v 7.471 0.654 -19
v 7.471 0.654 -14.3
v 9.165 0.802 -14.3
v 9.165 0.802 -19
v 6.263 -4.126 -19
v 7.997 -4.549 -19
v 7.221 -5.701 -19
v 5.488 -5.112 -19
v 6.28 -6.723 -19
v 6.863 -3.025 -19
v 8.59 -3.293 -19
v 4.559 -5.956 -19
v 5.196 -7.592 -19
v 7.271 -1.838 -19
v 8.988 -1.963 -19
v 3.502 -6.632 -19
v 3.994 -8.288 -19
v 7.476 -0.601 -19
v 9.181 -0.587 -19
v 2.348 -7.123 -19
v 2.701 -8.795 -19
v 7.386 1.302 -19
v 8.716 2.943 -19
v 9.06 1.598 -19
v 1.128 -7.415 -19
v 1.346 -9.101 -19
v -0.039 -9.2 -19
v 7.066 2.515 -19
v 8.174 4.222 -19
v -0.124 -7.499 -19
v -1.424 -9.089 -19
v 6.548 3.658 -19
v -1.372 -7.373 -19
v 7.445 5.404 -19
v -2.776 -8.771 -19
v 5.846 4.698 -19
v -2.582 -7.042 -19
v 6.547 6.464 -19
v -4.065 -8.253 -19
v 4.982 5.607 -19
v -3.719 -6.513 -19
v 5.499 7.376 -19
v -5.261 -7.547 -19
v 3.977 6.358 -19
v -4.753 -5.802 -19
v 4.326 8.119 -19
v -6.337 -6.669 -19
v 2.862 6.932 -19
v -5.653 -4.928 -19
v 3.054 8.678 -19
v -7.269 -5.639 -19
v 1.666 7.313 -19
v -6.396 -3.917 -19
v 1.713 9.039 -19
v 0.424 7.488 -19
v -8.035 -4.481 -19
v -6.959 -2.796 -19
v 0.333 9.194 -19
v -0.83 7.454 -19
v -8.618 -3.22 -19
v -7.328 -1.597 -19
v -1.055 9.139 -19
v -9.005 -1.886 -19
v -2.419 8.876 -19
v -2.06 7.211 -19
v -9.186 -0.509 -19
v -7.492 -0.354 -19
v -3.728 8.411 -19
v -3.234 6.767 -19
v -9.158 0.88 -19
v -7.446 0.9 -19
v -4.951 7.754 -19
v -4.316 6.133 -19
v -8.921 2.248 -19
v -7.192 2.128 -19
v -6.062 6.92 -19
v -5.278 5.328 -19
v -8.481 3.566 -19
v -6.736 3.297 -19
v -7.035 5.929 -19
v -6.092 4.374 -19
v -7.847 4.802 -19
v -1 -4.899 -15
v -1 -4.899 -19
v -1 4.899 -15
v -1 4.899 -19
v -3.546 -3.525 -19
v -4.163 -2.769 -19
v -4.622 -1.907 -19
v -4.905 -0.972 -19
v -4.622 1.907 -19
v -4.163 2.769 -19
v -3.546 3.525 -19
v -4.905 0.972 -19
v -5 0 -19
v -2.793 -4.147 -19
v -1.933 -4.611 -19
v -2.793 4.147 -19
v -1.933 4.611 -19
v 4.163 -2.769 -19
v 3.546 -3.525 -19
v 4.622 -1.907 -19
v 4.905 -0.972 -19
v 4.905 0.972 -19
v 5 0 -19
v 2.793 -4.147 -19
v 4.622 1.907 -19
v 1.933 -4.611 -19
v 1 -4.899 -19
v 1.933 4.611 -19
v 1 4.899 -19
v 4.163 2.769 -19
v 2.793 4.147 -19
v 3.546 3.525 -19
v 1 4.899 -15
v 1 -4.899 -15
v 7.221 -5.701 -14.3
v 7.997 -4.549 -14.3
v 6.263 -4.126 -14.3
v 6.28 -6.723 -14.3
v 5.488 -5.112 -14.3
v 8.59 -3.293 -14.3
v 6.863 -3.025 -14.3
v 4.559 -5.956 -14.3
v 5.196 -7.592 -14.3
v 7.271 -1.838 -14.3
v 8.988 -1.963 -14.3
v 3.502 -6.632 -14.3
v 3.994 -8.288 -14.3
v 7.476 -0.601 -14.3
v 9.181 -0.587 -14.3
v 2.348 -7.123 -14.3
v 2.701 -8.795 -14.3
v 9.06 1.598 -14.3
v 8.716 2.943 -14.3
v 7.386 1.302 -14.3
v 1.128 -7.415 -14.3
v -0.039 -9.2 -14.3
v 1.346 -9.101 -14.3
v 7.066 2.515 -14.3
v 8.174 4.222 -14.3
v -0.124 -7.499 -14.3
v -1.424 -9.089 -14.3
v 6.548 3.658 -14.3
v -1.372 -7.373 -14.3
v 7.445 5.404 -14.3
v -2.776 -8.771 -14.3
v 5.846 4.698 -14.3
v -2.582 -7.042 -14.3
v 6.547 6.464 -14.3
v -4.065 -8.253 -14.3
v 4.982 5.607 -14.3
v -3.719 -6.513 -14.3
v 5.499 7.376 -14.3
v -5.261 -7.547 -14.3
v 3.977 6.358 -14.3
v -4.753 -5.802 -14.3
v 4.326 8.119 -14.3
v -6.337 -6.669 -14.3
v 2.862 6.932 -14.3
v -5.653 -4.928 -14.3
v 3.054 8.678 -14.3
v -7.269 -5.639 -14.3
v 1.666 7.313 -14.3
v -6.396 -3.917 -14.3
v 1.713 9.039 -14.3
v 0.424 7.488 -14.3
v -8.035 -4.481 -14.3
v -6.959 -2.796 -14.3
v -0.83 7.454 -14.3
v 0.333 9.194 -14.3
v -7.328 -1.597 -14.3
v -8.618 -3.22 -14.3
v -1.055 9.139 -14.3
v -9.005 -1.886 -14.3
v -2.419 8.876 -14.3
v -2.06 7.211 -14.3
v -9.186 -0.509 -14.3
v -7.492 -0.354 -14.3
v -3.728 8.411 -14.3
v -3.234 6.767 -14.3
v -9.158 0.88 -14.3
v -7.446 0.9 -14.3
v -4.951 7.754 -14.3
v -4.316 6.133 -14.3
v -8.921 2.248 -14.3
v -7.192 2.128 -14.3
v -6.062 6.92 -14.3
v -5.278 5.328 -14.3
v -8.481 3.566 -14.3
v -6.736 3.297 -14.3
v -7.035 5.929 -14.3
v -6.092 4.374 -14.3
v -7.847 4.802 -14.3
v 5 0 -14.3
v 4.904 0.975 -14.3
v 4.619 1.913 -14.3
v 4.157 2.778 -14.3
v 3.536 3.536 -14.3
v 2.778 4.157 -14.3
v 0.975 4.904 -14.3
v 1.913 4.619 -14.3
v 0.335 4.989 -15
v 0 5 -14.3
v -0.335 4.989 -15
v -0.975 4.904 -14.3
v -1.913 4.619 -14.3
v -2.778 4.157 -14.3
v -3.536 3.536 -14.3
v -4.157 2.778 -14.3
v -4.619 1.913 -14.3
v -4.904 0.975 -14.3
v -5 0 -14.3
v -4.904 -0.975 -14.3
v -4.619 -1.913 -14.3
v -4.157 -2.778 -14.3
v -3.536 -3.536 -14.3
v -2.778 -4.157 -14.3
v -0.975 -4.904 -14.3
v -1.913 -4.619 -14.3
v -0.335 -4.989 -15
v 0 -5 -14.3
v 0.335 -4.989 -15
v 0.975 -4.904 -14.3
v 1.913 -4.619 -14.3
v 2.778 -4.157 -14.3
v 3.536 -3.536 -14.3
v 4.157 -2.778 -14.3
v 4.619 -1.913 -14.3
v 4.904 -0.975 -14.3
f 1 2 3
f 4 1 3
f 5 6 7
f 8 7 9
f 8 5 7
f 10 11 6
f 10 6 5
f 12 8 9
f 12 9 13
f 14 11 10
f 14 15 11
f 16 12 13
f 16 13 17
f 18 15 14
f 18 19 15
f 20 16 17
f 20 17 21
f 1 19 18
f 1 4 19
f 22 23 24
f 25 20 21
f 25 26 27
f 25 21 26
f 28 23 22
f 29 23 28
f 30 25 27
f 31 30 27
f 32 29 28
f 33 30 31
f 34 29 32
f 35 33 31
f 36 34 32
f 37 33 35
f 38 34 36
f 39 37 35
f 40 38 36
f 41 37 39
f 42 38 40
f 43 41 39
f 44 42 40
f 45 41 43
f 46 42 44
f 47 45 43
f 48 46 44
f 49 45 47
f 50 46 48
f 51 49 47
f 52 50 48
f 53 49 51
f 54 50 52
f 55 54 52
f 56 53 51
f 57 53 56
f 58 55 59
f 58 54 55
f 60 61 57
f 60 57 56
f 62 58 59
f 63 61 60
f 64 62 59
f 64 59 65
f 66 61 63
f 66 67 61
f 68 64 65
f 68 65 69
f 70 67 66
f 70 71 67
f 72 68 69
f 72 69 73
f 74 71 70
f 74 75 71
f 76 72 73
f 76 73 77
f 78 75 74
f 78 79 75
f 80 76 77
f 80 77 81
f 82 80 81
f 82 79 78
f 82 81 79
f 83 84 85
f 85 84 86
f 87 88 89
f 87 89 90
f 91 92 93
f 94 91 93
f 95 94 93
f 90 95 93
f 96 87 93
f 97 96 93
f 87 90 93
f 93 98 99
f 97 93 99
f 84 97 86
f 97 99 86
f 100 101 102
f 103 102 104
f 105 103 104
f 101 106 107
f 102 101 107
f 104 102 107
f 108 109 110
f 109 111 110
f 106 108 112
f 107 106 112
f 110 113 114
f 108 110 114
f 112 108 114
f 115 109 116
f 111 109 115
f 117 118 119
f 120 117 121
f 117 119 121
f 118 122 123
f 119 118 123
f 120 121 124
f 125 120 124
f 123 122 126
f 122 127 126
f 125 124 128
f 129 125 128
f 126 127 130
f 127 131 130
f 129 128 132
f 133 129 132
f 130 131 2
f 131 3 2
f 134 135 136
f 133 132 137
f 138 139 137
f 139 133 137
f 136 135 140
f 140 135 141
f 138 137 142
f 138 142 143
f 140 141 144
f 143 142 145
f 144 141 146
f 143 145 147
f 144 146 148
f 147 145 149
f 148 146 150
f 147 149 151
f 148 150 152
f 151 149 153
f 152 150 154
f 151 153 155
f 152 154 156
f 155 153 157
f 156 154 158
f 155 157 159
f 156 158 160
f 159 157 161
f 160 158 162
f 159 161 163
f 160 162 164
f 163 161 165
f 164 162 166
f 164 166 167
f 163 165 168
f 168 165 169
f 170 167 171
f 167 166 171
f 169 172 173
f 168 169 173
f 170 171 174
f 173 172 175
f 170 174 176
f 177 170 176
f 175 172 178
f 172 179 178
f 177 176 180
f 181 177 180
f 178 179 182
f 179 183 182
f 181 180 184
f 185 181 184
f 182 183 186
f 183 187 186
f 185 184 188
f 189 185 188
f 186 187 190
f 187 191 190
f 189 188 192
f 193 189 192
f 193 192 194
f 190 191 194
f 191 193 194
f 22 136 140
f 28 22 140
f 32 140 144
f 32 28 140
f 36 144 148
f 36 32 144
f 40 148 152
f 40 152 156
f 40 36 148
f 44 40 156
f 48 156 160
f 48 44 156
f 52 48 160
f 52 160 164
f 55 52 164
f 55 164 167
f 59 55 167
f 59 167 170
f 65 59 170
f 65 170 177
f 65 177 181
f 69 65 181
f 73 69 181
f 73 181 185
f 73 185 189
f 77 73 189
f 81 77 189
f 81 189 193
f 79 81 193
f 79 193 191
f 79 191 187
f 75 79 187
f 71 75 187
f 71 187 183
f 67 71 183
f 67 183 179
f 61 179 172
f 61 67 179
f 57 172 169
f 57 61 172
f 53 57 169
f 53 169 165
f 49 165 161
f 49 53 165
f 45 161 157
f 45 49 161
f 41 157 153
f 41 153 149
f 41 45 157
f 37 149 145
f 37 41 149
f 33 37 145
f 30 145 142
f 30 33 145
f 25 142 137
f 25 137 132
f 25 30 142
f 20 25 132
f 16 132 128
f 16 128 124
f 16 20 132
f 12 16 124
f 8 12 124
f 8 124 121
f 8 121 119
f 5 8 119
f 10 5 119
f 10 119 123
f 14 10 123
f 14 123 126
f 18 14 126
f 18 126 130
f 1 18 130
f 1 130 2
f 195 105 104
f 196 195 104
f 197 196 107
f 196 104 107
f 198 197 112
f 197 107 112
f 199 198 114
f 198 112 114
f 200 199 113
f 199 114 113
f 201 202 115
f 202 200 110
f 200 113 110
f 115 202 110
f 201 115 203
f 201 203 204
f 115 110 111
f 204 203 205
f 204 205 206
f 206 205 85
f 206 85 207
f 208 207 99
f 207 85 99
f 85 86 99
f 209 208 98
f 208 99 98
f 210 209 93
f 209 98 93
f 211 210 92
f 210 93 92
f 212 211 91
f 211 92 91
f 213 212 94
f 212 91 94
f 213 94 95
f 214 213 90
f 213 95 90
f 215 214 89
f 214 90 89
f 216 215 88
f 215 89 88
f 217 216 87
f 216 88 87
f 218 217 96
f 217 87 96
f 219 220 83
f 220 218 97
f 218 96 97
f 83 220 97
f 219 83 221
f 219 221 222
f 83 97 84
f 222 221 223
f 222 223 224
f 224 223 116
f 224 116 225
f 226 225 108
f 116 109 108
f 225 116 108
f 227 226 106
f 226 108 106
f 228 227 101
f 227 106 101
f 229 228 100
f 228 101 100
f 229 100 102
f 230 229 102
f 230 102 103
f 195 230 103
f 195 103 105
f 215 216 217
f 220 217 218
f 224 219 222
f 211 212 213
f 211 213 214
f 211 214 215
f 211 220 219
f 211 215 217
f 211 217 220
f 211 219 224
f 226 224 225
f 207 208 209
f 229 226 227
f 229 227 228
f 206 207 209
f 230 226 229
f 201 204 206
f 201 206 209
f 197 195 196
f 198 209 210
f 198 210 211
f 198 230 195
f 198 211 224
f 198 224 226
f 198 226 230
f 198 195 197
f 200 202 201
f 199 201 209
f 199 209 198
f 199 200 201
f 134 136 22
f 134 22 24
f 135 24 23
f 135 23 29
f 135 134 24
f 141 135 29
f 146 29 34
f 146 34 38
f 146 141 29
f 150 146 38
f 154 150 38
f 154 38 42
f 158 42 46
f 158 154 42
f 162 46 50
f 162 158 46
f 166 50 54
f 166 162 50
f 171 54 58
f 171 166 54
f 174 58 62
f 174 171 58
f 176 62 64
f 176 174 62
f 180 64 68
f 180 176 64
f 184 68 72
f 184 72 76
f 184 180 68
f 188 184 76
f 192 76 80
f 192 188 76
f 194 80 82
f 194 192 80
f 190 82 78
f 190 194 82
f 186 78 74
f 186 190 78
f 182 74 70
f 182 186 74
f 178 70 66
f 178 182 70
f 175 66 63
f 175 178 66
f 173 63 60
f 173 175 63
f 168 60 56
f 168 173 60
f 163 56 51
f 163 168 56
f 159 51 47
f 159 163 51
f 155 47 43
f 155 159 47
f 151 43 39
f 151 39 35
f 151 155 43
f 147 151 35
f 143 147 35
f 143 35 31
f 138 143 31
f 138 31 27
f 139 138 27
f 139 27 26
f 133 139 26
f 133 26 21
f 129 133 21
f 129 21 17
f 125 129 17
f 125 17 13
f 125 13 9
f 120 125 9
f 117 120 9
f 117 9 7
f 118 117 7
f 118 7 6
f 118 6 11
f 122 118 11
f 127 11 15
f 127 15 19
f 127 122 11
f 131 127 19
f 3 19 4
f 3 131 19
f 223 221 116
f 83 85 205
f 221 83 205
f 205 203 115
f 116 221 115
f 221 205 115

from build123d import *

# Parameters (mm, degrees)
BOX022_W                    = 2
BOX022_H                    = 12
BOX022_DEPTH                = 4
CYLINDER134_R               = 5
CYLINDER134_DEPTH           = 4.7
CYLINDER135_R               = 7.5
CYLINDER135_DEPTH           = 4.7
CYLINDER136_W               = 9.2
CYLINDER136_H               = 4.7
CYLINDER136_ANGLE           = 355
CYLINDER136_PLACEMENT_ANGLE = 10


with BuildPart() as cube022:
    # Box022 → Box022 (new body)
    with BuildSketch(Plane(origin=(-1, -6, -19), x_dir=(1, 0, 0), z_dir=(0, 0, 1))):
        with Locations((1, 6)):
            Rectangle(BOX022_W, BOX022_H)
    extrude(amount=BOX022_DEPTH)


with BuildPart() as hub_rear_cap_support:
    # Cylinder134 → Cylinder134 (new body)
    with BuildSketch(Plane.XY.offset(-19)):
        Circle(CYLINDER134_R)
    extrude(amount=CYLINDER134_DEPTH)


with BuildPart() as hub_rear_cap_support001:
    # Cylinder135 → Cylinder135 (new body)
    with BuildSketch(Plane.XY.offset(-19)):
        Circle(CYLINDER135_R)
    extrude(amount=CYLINDER135_DEPTH)


with BuildPart() as cut085:
    # Cylinder136 → Cylinder136 (revolve)
    with BuildSketch(Plane.XZ):
        with Locations((4.6, 2.35)):
            Rectangle(CYLINDER136_W, CYLINDER136_H)
    revolve(axis=Axis((0, 0, 0), (0, 0, 1)), revolution_arc=CYLINDER136_ANGLE)


with BuildPart() as cut085_1:
    # Cylinder136 placement: moved
    add(cut085.part.moved(Location((0, 0, -19))).rotate(Axis((0, 0, -19), (0, 0, 1)), CYLINDER136_PLACEMENT_ANGLE))

    # Cut084: cut hub-rear-cap-support001
    add(hub_rear_cap_support001.part, mode=Mode.SUBTRACT)

    # Fusion084: union hub-rear-cap-support_
    add(hub_rear_cap_support.part)

    # Cut085: cut Cube022
    add(cube022.part, mode=Mode.SUBTRACT)


solid = cut085_1.part
